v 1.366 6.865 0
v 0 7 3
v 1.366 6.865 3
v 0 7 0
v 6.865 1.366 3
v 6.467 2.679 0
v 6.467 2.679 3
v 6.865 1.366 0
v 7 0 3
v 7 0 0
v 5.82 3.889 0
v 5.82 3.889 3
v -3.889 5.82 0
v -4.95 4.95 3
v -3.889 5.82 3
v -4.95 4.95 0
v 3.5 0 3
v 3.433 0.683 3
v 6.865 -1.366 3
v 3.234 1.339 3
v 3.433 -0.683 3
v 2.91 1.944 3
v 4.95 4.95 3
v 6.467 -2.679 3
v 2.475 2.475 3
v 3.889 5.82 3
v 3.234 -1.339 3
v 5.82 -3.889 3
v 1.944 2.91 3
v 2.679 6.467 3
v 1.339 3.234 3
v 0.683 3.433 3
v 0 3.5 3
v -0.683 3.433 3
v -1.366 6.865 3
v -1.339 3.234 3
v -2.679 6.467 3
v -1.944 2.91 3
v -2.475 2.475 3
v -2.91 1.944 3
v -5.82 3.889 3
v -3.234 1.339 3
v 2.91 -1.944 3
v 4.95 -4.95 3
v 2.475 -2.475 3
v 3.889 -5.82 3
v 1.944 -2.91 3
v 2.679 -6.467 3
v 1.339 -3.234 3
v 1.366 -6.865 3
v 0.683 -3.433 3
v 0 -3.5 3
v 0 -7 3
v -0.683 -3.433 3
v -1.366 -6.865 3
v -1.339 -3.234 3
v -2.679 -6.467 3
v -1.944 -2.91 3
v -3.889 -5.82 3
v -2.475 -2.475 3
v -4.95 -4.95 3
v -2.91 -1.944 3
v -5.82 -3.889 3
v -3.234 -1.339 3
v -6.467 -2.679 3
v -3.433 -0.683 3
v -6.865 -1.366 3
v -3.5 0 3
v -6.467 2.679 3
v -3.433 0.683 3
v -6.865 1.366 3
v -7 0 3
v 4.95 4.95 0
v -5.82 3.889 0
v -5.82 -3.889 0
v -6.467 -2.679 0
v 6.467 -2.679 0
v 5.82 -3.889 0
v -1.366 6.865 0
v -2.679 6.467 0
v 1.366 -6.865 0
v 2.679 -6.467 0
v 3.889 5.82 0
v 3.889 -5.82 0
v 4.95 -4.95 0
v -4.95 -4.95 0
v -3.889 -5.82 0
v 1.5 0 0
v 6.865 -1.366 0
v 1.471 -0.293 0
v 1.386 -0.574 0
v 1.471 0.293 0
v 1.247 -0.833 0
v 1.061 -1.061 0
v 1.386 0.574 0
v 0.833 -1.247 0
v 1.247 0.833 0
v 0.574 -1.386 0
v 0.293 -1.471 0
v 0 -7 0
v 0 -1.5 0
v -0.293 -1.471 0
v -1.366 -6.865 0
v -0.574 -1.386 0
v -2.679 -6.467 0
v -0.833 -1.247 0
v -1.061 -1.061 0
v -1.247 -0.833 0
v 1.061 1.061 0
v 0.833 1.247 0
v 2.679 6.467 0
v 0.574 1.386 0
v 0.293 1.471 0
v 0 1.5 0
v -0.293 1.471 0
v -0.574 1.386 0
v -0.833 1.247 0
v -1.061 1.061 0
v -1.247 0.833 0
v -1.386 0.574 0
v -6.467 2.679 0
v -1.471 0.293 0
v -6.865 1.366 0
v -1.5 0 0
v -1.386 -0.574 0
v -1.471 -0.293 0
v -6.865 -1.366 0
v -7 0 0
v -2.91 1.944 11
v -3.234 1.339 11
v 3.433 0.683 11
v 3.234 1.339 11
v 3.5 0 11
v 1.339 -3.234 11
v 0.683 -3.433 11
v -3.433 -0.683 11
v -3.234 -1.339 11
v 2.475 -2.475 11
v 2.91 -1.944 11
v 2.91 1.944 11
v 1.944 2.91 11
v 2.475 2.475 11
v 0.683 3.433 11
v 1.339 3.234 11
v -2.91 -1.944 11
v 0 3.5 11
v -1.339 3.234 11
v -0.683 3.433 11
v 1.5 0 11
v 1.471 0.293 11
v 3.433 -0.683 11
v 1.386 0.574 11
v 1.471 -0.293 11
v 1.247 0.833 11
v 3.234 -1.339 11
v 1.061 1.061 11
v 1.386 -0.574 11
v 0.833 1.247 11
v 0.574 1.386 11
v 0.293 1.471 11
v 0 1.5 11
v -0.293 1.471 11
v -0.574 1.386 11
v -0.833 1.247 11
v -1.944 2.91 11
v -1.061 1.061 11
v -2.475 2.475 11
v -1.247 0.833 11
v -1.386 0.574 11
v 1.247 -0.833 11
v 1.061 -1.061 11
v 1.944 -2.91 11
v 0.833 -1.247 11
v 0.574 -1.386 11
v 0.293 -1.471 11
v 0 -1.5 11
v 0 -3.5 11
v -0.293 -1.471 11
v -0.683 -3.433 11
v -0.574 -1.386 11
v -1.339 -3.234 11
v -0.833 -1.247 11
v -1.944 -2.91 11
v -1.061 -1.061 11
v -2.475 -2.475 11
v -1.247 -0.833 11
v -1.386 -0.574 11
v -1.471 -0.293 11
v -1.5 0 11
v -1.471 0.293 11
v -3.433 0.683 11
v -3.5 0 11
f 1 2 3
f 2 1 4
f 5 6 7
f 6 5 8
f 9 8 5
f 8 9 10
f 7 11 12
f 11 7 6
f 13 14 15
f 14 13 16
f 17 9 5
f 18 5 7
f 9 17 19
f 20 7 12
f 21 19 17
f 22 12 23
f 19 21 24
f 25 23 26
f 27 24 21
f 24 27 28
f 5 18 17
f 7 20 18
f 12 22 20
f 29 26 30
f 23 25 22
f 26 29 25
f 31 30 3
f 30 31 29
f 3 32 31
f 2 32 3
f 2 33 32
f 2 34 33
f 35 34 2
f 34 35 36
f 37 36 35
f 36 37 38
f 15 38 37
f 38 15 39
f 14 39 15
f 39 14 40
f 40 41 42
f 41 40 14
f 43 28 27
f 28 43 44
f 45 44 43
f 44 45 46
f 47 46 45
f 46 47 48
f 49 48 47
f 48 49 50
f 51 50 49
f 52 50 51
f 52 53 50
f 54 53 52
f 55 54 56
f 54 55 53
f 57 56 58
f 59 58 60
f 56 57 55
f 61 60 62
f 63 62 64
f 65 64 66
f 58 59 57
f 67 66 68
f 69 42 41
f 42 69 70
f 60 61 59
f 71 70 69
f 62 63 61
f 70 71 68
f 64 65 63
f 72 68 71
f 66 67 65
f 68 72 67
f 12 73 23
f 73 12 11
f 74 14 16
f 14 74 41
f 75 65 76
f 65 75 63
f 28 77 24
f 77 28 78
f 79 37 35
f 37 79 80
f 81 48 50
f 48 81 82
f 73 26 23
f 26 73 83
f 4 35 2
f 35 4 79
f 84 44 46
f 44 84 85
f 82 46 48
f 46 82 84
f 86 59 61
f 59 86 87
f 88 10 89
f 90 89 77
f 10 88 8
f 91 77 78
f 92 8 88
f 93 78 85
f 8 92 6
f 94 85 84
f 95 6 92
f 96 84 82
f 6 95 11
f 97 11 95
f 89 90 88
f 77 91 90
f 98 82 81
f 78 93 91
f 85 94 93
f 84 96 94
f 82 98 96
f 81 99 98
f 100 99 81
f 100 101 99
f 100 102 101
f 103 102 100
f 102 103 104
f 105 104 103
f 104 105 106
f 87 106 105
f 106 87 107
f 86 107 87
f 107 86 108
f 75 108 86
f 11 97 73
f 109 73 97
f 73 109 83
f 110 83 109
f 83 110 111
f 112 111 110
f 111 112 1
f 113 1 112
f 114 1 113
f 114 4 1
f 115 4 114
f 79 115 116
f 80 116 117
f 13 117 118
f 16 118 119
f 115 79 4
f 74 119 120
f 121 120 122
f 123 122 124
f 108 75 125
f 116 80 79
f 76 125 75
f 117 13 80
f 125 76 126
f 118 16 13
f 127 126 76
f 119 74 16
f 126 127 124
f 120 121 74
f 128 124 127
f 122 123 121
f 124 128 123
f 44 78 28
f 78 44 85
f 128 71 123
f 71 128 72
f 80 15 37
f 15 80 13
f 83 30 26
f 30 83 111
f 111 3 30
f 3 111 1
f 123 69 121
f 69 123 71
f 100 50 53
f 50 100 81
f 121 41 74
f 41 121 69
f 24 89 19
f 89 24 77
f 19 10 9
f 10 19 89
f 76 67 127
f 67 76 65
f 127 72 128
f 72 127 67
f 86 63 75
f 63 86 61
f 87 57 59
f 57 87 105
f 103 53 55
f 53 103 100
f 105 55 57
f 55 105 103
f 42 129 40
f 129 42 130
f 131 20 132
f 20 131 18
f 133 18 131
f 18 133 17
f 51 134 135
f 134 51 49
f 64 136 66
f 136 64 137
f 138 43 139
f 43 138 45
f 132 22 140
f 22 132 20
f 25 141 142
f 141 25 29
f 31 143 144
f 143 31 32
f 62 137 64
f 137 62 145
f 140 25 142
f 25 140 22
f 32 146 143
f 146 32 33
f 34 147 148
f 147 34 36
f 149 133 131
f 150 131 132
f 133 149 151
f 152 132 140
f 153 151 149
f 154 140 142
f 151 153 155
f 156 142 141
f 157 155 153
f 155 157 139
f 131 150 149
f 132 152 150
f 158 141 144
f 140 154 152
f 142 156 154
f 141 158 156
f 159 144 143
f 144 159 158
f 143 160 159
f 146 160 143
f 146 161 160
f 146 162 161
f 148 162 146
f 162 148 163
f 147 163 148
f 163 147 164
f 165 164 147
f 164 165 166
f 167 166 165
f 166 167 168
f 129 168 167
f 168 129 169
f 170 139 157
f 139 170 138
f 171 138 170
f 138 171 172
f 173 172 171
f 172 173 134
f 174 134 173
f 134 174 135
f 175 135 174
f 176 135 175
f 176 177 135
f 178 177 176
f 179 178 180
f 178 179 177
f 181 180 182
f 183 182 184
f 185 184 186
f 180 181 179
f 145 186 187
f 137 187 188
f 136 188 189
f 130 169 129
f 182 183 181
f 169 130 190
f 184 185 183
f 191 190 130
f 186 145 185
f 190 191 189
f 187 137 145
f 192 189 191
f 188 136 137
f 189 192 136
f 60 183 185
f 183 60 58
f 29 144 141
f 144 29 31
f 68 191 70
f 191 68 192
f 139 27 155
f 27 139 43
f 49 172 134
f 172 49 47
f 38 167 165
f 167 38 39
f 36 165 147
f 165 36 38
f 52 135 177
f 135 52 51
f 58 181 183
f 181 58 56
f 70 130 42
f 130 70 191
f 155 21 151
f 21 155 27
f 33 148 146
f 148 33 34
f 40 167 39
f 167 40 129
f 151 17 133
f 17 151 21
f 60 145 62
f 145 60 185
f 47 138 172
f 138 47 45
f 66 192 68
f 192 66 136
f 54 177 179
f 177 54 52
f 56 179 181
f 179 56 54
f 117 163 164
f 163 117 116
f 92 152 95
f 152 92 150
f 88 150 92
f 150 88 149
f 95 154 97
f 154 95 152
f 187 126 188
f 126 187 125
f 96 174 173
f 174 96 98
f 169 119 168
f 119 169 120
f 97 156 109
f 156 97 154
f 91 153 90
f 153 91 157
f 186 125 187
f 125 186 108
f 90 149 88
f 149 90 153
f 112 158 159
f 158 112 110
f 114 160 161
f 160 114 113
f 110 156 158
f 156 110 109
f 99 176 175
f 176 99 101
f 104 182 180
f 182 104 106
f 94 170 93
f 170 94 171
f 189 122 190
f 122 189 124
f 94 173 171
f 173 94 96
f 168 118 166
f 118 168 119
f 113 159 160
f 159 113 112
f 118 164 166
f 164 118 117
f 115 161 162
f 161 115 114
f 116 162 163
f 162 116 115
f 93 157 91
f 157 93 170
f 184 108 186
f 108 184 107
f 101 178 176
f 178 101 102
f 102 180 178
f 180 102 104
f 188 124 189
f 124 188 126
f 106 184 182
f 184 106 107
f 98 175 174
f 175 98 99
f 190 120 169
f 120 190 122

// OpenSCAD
$fn = 32;

// ----------------------------------------------------------------------
// Micro post: flanged post, 5-20 mm class
// ----------------------------------------------------------------------

// --- parameters (mm) ---
post_d = 7;               // post diameter
post_h = 8;               // post height above the flange
flange_d = 14;            // flange diameter
flange_t = 3;             // flange thickness
bore_d = 3;               // through bore

total_h = post_h + flange_t;  // overall height

difference() {
  union() {
    cylinder(h = flange_t, d = flange_d);
    translate([0, 0, flange_t]) cylinder(h = post_h, d = post_d);
  }
  translate([0, 0, -1]) cylinder(h = total_h + 2, d = bore_d);
}
